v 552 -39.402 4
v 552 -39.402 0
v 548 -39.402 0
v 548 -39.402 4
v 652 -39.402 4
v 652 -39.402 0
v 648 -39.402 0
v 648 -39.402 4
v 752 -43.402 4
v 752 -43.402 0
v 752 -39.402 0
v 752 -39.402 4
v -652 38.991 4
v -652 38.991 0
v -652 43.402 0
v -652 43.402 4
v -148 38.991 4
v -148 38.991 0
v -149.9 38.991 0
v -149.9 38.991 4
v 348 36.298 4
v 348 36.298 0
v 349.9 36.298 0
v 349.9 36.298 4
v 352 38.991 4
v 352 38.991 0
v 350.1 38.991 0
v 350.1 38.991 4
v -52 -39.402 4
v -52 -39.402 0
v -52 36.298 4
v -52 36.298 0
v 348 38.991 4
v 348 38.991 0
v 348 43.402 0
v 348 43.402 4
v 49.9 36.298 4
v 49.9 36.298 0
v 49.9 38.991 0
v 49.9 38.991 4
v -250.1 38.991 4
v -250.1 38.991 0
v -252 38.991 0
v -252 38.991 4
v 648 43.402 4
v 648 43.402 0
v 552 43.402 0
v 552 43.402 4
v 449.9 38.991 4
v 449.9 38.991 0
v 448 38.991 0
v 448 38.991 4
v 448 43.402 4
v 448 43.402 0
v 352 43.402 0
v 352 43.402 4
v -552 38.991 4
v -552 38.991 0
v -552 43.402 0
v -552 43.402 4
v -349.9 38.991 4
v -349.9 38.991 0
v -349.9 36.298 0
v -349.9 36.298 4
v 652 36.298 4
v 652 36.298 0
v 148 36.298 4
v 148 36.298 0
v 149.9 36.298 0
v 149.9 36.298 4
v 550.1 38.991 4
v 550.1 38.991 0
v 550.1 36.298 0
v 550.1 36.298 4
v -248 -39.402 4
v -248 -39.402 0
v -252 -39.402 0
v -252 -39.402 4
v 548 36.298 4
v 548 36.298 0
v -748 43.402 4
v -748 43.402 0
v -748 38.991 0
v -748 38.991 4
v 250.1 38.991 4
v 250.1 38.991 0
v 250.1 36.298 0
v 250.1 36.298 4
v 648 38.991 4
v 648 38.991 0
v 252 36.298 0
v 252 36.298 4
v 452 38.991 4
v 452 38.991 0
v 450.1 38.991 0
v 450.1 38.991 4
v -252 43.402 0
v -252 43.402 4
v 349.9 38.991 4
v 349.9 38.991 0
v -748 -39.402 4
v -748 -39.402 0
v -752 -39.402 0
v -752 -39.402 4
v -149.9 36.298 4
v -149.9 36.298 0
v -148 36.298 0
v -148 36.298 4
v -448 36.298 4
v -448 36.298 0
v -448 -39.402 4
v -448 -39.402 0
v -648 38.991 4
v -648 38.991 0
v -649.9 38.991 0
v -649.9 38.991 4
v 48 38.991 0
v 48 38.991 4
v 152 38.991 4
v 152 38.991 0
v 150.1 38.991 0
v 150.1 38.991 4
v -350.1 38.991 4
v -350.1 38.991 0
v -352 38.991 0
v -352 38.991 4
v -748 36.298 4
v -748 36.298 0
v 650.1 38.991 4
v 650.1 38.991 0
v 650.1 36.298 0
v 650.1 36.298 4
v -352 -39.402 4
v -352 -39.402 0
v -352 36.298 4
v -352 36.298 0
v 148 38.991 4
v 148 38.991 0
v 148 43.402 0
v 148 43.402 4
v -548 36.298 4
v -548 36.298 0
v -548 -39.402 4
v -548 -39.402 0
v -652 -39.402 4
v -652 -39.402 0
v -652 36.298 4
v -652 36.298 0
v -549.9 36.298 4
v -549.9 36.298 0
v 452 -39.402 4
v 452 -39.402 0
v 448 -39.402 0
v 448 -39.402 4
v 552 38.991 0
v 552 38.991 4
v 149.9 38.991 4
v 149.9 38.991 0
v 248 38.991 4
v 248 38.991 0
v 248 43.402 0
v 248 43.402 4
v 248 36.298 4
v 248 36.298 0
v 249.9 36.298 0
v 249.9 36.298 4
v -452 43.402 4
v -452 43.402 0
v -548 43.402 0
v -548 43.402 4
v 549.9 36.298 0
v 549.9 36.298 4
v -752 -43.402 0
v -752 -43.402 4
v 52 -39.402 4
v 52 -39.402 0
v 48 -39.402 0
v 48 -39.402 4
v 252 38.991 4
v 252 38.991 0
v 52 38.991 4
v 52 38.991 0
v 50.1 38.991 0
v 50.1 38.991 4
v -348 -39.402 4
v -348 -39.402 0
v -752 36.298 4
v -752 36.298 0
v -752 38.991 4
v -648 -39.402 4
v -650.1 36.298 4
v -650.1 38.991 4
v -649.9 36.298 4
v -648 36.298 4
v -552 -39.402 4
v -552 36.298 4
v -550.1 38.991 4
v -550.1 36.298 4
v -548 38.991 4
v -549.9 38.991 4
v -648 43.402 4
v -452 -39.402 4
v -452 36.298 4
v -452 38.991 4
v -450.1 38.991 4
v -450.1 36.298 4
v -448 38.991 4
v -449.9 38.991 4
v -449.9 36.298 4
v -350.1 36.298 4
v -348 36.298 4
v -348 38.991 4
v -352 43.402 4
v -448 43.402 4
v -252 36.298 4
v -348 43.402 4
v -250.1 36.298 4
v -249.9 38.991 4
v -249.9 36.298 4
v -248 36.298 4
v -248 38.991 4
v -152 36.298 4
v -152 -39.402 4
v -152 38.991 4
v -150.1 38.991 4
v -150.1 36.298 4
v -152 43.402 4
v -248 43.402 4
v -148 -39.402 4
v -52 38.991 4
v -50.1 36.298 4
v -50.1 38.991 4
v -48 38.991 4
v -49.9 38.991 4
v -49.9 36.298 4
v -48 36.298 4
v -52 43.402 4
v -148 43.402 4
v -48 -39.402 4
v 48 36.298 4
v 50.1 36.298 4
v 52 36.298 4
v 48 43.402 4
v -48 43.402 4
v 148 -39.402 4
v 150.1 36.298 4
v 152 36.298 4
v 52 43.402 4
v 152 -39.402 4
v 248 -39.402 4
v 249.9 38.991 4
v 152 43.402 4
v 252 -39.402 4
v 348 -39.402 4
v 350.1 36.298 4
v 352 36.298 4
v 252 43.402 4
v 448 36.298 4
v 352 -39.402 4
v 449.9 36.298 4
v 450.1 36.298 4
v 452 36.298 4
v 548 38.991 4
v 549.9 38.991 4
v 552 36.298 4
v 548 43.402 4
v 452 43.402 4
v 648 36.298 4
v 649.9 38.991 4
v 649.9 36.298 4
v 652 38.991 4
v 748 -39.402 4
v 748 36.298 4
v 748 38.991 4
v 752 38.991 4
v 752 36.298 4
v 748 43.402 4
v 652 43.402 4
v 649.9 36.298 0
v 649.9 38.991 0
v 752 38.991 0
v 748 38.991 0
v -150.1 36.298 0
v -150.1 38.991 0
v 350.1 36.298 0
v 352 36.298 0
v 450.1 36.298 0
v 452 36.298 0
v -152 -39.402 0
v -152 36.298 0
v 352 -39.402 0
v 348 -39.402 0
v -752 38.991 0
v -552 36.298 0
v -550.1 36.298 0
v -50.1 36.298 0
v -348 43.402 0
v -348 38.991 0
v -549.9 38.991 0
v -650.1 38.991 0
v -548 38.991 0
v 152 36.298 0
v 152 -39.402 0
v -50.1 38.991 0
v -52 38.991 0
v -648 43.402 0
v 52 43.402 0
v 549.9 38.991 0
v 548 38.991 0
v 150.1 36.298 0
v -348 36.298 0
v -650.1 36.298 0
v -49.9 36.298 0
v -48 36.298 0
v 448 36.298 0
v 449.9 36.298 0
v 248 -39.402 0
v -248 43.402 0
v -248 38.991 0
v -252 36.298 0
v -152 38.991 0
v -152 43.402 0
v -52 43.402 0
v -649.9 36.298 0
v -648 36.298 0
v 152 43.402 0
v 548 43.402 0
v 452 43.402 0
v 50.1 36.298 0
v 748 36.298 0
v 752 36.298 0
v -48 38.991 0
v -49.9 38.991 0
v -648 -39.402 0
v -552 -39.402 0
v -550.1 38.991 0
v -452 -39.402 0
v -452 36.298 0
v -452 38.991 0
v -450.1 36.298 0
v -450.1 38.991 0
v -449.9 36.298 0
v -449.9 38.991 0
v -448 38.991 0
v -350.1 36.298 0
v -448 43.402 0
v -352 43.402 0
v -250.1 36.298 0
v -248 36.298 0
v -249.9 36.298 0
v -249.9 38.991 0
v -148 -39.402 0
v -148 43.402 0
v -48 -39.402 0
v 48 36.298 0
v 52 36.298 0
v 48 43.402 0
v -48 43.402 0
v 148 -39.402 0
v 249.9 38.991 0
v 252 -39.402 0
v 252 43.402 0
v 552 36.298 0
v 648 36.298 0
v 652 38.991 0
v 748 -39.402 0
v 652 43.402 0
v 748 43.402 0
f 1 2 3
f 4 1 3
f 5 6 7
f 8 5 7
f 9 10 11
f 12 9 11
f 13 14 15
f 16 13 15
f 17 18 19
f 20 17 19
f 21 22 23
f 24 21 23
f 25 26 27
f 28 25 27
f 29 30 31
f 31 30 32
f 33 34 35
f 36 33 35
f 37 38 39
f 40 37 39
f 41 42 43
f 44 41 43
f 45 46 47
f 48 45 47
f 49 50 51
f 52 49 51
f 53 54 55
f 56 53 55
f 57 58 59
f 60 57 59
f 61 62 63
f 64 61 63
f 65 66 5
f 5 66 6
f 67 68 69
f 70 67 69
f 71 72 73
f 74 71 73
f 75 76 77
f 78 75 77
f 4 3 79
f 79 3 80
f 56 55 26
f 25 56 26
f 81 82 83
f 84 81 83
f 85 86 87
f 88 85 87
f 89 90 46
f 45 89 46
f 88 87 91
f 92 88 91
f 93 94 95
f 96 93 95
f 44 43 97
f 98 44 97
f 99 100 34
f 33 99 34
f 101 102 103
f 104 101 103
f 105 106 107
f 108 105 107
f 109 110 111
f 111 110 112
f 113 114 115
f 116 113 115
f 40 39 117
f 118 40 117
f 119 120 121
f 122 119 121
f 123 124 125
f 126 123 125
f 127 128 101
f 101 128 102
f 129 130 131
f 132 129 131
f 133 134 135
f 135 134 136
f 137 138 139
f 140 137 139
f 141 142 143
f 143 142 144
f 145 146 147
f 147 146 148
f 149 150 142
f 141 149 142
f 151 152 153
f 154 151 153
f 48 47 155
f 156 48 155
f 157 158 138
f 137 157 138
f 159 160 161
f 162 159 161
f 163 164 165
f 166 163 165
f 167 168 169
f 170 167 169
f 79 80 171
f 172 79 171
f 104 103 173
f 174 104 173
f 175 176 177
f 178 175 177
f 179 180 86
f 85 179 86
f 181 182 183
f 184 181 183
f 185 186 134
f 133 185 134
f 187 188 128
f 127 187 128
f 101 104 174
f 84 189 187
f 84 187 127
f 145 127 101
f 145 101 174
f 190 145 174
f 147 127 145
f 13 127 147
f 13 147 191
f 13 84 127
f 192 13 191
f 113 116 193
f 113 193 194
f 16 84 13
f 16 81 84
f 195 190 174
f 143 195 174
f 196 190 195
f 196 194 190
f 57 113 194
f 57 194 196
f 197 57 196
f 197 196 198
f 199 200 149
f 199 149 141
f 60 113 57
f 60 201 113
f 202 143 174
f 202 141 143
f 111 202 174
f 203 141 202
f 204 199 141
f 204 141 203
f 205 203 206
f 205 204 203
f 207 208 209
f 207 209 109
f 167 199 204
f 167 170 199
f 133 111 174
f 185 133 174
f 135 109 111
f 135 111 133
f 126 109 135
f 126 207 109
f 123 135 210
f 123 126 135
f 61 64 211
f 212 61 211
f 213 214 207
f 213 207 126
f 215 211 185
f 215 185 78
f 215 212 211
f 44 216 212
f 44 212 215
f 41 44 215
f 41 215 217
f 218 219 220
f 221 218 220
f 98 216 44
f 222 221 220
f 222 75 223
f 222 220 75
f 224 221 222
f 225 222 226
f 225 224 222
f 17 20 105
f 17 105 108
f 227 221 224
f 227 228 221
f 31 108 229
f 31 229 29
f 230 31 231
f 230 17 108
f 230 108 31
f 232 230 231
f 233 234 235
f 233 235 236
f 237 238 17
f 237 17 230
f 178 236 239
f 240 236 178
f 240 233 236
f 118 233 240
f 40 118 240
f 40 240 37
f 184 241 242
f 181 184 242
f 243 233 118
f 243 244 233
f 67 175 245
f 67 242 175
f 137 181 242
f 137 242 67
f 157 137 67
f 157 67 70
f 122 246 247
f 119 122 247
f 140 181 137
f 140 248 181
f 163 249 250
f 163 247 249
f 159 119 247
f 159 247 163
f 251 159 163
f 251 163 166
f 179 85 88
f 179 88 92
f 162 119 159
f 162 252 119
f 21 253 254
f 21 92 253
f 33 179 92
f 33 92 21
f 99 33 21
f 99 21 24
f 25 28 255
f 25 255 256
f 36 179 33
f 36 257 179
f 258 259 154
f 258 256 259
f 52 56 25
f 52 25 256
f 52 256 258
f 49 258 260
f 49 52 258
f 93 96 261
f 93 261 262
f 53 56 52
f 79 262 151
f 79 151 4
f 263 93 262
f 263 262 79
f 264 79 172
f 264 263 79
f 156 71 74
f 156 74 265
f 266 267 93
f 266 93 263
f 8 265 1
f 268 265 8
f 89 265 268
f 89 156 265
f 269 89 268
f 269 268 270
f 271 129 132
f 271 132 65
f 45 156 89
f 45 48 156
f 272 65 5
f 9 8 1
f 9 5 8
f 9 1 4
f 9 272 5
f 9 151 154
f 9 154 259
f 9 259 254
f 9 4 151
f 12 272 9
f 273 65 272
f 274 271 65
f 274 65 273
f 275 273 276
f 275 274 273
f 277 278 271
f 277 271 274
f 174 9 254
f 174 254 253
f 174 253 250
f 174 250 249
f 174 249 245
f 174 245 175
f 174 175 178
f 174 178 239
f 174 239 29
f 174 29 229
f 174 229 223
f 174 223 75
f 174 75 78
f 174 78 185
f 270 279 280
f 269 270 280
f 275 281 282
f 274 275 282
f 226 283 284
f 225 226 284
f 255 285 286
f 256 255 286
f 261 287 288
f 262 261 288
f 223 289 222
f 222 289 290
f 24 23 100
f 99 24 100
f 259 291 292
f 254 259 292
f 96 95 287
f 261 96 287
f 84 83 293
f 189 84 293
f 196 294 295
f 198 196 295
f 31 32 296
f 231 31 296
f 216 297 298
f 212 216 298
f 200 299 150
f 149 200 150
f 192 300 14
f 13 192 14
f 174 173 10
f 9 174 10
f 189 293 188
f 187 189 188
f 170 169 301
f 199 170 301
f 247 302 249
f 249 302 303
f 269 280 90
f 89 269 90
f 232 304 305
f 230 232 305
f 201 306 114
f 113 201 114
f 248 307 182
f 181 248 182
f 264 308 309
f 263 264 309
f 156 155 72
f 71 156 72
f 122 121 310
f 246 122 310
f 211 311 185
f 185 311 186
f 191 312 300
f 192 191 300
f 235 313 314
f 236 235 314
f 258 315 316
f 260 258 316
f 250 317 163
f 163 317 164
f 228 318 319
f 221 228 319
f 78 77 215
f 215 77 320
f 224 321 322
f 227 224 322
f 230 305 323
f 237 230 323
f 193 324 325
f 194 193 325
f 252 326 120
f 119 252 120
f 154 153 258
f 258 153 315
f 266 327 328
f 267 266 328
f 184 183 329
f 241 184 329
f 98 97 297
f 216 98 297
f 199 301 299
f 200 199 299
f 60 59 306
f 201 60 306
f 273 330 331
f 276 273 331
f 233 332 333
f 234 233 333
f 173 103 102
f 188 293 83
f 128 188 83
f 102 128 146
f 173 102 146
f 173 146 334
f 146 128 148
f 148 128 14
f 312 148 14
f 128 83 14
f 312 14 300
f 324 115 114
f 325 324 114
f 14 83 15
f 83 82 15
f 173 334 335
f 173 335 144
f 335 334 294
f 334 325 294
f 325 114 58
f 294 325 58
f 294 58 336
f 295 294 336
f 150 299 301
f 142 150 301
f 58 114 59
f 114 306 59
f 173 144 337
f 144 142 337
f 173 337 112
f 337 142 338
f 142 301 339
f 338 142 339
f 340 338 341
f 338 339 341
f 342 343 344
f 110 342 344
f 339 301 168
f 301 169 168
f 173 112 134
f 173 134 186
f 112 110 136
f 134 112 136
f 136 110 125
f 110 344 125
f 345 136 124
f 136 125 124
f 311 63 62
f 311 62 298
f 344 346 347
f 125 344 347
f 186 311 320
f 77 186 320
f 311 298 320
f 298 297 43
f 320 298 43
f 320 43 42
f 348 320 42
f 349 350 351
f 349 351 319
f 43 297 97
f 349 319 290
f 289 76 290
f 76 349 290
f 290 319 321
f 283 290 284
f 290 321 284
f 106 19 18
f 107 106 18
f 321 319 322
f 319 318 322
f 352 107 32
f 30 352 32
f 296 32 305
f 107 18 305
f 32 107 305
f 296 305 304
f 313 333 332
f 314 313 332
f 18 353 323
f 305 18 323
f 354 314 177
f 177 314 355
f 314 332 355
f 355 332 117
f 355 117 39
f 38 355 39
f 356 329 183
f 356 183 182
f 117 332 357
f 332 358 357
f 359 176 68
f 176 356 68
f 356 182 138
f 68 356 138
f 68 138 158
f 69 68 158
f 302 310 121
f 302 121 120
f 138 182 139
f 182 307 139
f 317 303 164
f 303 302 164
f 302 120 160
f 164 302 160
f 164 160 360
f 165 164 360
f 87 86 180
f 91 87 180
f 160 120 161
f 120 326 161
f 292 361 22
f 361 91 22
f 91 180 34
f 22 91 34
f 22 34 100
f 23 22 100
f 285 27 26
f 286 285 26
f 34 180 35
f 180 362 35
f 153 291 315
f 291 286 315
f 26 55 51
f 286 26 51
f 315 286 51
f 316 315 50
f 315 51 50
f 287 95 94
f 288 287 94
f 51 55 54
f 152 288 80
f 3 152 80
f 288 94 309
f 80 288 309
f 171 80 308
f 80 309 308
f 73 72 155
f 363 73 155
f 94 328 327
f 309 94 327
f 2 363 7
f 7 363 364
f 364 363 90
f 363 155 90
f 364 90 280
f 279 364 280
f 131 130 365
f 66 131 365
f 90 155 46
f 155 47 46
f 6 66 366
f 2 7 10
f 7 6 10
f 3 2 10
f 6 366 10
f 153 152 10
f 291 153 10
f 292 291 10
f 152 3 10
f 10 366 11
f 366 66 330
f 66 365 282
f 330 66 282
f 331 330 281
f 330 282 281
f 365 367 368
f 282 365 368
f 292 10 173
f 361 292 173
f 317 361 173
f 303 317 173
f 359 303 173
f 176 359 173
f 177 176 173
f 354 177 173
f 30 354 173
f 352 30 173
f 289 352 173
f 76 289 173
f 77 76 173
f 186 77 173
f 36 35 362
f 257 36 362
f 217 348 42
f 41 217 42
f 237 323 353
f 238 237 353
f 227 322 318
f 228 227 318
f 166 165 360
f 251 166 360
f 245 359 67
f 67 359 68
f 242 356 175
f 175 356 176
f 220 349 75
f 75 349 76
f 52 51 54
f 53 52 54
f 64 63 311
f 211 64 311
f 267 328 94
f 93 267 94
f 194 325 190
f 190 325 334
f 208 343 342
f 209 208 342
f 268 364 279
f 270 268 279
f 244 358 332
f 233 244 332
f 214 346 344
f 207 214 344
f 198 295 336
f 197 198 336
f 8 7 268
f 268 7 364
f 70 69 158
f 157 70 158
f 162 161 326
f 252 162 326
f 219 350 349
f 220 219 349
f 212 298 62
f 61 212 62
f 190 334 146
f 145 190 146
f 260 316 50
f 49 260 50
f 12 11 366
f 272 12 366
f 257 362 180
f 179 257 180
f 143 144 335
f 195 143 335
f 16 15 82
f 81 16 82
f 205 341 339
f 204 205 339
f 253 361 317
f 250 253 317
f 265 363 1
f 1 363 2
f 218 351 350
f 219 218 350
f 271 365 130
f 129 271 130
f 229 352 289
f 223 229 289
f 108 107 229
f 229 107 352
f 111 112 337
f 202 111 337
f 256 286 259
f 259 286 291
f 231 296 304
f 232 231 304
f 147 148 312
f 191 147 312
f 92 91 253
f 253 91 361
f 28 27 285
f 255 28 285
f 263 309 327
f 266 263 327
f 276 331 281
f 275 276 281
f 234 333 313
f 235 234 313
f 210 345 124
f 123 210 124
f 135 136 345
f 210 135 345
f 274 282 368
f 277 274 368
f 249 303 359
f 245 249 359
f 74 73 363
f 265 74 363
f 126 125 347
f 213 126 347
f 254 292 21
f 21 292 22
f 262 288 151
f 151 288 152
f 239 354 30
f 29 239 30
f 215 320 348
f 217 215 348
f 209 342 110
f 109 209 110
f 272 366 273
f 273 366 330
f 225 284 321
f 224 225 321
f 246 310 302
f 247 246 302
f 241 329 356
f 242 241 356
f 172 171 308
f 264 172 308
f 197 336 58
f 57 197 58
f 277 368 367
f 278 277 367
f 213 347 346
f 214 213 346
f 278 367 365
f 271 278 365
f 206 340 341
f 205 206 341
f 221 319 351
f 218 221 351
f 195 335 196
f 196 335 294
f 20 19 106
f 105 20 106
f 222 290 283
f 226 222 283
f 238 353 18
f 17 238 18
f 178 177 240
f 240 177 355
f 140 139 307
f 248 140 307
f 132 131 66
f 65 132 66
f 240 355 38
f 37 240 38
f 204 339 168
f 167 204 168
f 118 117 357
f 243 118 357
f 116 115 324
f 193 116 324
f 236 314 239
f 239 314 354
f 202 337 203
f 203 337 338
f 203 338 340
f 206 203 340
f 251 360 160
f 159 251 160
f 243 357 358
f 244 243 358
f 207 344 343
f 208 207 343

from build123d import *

# Parameters (mm, degrees)
BOSS_EXTRUDE1_DEPTH = 4


with BuildPart() as part:
    # Sketch2 → Boss-Extrude1 (new body)
    with BuildSketch(Plane.XY):
        Polygon((-752, 38.99099655), (-752, 36.297950089), (-748, 36.297950089), (-748, -39.401624923), (-752, -39.401624923), (-752, -43.401624923), (752, -43.401624923), (752, -39.401624923), (748, -39.401624923), (748, 36.297950089), (752, 36.297950089), (752, 38.99099655), (748, 38.99099655), (748, 43.401624923), (652, 43.401624923), (652, 38.99099655), (650.1, 38.99099655), (650.1, 36.297950089), (652, 36.297950089), (652, -39.401624923), (648, -39.401624923), (648, 36.297950089), (649.9, 36.297950089), (649.9, 38.99099655), (648, 38.99099655), (648, 43.401624923), (552, 43.401624923), (552, 38.99099655), (550.1, 38.99099655), (550.1, 36.297950089), (552, 36.297950089), (552, -39.401624923), (548, -39.401624923), (548, 36.297950089), (549.9, 36.297950089), (549.9, 38.99099655), (548, 38.99099655), (548, 43.401624923), (452, 43.401624923), (452, 38.99099655), (450.1, 38.99099655), (450.1, 36.297950089), (452, 36.297950089), (452, -39.401624923), (448, -39.401624923), (448, 36.297950089), (449.9, 36.297950089), (449.9, 38.99099655), (448, 38.99099655), (448, 43.401624923), (352, 43.401624923), (352, 38.99099655), (350.1, 38.99099655), (350.1, 36.297950089), (352, 36.297950089), (352, -39.401624923), (350, -39.401624923), (348, -39.401624923), (348, 36.297950089), (349.9, 36.297950089), (349.9, 38.99099655), (348, 38.99099655), (348, 43.401624923), (252, 43.401624923), (252, 38.99099655), (250.1, 38.99099655), (250.1, 36.297950089), (252, 36.297950089), (252, -39.401624923), (250, -39.401624923), (248, -39.401624923), (248, 36.297950089), (249.9, 36.297950089), (249.9, 38.99099655), (248, 38.99099655), (248, 43.401624923), (152, 43.401624923), (152, 38.99099655), (150.1, 38.99099655), (150.1, 36.297950089), (152, 36.297950089), (152, -39.401624923), (148, -39.401624923), (148, 36.297950089), (149.9, 36.297950089), (149.9, 38.99099655), (148, 38.99099655), (148, 43.401624923), (52, 43.401624923), (52, 38.99099655), (50.1, 38.99099655), (50.1, 36.297950089), (52, 36.297950089), (52, -39.401624923), (48, -39.401624923), (48, 36.297950089), (49.9, 36.297950089), (49.9, 38.99099655), (48, 38.99099655), (48, 43.401624923), (-48, 43.401624923), (-48, 38.99099655), (-49.9, 38.99099655), (-49.9, 36.297950089), (-48, 36.297950089), (-48, -39.401624923), (-52, -39.401624923), (-52, 36.297950089), (-50.1, 36.297950089), (-50.1, 38.99099655), (-52, 38.99099655), (-52, 43.401624923), (-148, 43.401624923), (-148, 38.99099655), (-149.9, 38.99099655), (-149.9, 36.297950089), (-148, 36.297950089), (-148, -39.401624923), (-152, -39.401624923), (-152, 36.297950089), (-150.1, 36.297950089), (-150.1, 38.99099655), (-152, 38.99099655), (-152, 43.401624923), (-248, 43.401624923), (-248, 38.99099655), (-249.9, 38.99099655), (-249.9, 36.297950089), (-248, 36.297950089), (-248, -39.401624923), (-252, -39.401624923), (-252, 36.297950089), (-250.1, 36.297950089), (-250.1, 38.99099655), (-252, 38.99099655), (-252, 43.401624923), (-348, 43.401624923), (-348, 38.99099655), (-349.9, 38.99099655), (-349.9, 36.297950089), (-348, 36.297950089), (-348, -39.401624923), (-352, -39.401624923), (-352, 36.297950089), (-350.1, 36.297950089), (-350.1, 38.99099655), (-352, 38.99099655), (-352, 43.401624923), (-448, 43.401624923), (-448, 38.99099655), (-449.9, 38.99099655), (-449.9, 36.297950089), (-448, 36.297950089), (-448, -39.401624923), (-452, -39.401624923), (-452, 36.297950089), (-450.1, 36.297950089), (-450.1, 38.99099655), (-452, 38.99099655), (-452, 43.401624923), (-548, 43.401624923), (-548, 38.99099655), (-549.9, 38.99099655), (-549.9, 36.297950089), (-548, 36.297950089), (-548, -39.401624923), (-552, -39.401624923), (-552, 36.297950089), (-550.1, 36.297950089), (-550.1, 38.99099655), (-552, 38.99099655), (-552, 43.401624923), (-648, 43.401624923), (-648, 38.99099655), (-649.9, 38.99099655), (-649.9, 36.297950089), (-648, 36.297950089), (-648, -39.401624923), (-652, -39.401624923), (-652, 36.297950089), (-650.1, 36.297950089), (-650.1, 38.99099655), (-652, 38.99099655), (-652, 43.401624923), (-748, 43.401624923), (-748, 38.99099655), align=None)
    extrude(amount=BOSS_EXTRUDE1_DEPTH)


solid = part.part
